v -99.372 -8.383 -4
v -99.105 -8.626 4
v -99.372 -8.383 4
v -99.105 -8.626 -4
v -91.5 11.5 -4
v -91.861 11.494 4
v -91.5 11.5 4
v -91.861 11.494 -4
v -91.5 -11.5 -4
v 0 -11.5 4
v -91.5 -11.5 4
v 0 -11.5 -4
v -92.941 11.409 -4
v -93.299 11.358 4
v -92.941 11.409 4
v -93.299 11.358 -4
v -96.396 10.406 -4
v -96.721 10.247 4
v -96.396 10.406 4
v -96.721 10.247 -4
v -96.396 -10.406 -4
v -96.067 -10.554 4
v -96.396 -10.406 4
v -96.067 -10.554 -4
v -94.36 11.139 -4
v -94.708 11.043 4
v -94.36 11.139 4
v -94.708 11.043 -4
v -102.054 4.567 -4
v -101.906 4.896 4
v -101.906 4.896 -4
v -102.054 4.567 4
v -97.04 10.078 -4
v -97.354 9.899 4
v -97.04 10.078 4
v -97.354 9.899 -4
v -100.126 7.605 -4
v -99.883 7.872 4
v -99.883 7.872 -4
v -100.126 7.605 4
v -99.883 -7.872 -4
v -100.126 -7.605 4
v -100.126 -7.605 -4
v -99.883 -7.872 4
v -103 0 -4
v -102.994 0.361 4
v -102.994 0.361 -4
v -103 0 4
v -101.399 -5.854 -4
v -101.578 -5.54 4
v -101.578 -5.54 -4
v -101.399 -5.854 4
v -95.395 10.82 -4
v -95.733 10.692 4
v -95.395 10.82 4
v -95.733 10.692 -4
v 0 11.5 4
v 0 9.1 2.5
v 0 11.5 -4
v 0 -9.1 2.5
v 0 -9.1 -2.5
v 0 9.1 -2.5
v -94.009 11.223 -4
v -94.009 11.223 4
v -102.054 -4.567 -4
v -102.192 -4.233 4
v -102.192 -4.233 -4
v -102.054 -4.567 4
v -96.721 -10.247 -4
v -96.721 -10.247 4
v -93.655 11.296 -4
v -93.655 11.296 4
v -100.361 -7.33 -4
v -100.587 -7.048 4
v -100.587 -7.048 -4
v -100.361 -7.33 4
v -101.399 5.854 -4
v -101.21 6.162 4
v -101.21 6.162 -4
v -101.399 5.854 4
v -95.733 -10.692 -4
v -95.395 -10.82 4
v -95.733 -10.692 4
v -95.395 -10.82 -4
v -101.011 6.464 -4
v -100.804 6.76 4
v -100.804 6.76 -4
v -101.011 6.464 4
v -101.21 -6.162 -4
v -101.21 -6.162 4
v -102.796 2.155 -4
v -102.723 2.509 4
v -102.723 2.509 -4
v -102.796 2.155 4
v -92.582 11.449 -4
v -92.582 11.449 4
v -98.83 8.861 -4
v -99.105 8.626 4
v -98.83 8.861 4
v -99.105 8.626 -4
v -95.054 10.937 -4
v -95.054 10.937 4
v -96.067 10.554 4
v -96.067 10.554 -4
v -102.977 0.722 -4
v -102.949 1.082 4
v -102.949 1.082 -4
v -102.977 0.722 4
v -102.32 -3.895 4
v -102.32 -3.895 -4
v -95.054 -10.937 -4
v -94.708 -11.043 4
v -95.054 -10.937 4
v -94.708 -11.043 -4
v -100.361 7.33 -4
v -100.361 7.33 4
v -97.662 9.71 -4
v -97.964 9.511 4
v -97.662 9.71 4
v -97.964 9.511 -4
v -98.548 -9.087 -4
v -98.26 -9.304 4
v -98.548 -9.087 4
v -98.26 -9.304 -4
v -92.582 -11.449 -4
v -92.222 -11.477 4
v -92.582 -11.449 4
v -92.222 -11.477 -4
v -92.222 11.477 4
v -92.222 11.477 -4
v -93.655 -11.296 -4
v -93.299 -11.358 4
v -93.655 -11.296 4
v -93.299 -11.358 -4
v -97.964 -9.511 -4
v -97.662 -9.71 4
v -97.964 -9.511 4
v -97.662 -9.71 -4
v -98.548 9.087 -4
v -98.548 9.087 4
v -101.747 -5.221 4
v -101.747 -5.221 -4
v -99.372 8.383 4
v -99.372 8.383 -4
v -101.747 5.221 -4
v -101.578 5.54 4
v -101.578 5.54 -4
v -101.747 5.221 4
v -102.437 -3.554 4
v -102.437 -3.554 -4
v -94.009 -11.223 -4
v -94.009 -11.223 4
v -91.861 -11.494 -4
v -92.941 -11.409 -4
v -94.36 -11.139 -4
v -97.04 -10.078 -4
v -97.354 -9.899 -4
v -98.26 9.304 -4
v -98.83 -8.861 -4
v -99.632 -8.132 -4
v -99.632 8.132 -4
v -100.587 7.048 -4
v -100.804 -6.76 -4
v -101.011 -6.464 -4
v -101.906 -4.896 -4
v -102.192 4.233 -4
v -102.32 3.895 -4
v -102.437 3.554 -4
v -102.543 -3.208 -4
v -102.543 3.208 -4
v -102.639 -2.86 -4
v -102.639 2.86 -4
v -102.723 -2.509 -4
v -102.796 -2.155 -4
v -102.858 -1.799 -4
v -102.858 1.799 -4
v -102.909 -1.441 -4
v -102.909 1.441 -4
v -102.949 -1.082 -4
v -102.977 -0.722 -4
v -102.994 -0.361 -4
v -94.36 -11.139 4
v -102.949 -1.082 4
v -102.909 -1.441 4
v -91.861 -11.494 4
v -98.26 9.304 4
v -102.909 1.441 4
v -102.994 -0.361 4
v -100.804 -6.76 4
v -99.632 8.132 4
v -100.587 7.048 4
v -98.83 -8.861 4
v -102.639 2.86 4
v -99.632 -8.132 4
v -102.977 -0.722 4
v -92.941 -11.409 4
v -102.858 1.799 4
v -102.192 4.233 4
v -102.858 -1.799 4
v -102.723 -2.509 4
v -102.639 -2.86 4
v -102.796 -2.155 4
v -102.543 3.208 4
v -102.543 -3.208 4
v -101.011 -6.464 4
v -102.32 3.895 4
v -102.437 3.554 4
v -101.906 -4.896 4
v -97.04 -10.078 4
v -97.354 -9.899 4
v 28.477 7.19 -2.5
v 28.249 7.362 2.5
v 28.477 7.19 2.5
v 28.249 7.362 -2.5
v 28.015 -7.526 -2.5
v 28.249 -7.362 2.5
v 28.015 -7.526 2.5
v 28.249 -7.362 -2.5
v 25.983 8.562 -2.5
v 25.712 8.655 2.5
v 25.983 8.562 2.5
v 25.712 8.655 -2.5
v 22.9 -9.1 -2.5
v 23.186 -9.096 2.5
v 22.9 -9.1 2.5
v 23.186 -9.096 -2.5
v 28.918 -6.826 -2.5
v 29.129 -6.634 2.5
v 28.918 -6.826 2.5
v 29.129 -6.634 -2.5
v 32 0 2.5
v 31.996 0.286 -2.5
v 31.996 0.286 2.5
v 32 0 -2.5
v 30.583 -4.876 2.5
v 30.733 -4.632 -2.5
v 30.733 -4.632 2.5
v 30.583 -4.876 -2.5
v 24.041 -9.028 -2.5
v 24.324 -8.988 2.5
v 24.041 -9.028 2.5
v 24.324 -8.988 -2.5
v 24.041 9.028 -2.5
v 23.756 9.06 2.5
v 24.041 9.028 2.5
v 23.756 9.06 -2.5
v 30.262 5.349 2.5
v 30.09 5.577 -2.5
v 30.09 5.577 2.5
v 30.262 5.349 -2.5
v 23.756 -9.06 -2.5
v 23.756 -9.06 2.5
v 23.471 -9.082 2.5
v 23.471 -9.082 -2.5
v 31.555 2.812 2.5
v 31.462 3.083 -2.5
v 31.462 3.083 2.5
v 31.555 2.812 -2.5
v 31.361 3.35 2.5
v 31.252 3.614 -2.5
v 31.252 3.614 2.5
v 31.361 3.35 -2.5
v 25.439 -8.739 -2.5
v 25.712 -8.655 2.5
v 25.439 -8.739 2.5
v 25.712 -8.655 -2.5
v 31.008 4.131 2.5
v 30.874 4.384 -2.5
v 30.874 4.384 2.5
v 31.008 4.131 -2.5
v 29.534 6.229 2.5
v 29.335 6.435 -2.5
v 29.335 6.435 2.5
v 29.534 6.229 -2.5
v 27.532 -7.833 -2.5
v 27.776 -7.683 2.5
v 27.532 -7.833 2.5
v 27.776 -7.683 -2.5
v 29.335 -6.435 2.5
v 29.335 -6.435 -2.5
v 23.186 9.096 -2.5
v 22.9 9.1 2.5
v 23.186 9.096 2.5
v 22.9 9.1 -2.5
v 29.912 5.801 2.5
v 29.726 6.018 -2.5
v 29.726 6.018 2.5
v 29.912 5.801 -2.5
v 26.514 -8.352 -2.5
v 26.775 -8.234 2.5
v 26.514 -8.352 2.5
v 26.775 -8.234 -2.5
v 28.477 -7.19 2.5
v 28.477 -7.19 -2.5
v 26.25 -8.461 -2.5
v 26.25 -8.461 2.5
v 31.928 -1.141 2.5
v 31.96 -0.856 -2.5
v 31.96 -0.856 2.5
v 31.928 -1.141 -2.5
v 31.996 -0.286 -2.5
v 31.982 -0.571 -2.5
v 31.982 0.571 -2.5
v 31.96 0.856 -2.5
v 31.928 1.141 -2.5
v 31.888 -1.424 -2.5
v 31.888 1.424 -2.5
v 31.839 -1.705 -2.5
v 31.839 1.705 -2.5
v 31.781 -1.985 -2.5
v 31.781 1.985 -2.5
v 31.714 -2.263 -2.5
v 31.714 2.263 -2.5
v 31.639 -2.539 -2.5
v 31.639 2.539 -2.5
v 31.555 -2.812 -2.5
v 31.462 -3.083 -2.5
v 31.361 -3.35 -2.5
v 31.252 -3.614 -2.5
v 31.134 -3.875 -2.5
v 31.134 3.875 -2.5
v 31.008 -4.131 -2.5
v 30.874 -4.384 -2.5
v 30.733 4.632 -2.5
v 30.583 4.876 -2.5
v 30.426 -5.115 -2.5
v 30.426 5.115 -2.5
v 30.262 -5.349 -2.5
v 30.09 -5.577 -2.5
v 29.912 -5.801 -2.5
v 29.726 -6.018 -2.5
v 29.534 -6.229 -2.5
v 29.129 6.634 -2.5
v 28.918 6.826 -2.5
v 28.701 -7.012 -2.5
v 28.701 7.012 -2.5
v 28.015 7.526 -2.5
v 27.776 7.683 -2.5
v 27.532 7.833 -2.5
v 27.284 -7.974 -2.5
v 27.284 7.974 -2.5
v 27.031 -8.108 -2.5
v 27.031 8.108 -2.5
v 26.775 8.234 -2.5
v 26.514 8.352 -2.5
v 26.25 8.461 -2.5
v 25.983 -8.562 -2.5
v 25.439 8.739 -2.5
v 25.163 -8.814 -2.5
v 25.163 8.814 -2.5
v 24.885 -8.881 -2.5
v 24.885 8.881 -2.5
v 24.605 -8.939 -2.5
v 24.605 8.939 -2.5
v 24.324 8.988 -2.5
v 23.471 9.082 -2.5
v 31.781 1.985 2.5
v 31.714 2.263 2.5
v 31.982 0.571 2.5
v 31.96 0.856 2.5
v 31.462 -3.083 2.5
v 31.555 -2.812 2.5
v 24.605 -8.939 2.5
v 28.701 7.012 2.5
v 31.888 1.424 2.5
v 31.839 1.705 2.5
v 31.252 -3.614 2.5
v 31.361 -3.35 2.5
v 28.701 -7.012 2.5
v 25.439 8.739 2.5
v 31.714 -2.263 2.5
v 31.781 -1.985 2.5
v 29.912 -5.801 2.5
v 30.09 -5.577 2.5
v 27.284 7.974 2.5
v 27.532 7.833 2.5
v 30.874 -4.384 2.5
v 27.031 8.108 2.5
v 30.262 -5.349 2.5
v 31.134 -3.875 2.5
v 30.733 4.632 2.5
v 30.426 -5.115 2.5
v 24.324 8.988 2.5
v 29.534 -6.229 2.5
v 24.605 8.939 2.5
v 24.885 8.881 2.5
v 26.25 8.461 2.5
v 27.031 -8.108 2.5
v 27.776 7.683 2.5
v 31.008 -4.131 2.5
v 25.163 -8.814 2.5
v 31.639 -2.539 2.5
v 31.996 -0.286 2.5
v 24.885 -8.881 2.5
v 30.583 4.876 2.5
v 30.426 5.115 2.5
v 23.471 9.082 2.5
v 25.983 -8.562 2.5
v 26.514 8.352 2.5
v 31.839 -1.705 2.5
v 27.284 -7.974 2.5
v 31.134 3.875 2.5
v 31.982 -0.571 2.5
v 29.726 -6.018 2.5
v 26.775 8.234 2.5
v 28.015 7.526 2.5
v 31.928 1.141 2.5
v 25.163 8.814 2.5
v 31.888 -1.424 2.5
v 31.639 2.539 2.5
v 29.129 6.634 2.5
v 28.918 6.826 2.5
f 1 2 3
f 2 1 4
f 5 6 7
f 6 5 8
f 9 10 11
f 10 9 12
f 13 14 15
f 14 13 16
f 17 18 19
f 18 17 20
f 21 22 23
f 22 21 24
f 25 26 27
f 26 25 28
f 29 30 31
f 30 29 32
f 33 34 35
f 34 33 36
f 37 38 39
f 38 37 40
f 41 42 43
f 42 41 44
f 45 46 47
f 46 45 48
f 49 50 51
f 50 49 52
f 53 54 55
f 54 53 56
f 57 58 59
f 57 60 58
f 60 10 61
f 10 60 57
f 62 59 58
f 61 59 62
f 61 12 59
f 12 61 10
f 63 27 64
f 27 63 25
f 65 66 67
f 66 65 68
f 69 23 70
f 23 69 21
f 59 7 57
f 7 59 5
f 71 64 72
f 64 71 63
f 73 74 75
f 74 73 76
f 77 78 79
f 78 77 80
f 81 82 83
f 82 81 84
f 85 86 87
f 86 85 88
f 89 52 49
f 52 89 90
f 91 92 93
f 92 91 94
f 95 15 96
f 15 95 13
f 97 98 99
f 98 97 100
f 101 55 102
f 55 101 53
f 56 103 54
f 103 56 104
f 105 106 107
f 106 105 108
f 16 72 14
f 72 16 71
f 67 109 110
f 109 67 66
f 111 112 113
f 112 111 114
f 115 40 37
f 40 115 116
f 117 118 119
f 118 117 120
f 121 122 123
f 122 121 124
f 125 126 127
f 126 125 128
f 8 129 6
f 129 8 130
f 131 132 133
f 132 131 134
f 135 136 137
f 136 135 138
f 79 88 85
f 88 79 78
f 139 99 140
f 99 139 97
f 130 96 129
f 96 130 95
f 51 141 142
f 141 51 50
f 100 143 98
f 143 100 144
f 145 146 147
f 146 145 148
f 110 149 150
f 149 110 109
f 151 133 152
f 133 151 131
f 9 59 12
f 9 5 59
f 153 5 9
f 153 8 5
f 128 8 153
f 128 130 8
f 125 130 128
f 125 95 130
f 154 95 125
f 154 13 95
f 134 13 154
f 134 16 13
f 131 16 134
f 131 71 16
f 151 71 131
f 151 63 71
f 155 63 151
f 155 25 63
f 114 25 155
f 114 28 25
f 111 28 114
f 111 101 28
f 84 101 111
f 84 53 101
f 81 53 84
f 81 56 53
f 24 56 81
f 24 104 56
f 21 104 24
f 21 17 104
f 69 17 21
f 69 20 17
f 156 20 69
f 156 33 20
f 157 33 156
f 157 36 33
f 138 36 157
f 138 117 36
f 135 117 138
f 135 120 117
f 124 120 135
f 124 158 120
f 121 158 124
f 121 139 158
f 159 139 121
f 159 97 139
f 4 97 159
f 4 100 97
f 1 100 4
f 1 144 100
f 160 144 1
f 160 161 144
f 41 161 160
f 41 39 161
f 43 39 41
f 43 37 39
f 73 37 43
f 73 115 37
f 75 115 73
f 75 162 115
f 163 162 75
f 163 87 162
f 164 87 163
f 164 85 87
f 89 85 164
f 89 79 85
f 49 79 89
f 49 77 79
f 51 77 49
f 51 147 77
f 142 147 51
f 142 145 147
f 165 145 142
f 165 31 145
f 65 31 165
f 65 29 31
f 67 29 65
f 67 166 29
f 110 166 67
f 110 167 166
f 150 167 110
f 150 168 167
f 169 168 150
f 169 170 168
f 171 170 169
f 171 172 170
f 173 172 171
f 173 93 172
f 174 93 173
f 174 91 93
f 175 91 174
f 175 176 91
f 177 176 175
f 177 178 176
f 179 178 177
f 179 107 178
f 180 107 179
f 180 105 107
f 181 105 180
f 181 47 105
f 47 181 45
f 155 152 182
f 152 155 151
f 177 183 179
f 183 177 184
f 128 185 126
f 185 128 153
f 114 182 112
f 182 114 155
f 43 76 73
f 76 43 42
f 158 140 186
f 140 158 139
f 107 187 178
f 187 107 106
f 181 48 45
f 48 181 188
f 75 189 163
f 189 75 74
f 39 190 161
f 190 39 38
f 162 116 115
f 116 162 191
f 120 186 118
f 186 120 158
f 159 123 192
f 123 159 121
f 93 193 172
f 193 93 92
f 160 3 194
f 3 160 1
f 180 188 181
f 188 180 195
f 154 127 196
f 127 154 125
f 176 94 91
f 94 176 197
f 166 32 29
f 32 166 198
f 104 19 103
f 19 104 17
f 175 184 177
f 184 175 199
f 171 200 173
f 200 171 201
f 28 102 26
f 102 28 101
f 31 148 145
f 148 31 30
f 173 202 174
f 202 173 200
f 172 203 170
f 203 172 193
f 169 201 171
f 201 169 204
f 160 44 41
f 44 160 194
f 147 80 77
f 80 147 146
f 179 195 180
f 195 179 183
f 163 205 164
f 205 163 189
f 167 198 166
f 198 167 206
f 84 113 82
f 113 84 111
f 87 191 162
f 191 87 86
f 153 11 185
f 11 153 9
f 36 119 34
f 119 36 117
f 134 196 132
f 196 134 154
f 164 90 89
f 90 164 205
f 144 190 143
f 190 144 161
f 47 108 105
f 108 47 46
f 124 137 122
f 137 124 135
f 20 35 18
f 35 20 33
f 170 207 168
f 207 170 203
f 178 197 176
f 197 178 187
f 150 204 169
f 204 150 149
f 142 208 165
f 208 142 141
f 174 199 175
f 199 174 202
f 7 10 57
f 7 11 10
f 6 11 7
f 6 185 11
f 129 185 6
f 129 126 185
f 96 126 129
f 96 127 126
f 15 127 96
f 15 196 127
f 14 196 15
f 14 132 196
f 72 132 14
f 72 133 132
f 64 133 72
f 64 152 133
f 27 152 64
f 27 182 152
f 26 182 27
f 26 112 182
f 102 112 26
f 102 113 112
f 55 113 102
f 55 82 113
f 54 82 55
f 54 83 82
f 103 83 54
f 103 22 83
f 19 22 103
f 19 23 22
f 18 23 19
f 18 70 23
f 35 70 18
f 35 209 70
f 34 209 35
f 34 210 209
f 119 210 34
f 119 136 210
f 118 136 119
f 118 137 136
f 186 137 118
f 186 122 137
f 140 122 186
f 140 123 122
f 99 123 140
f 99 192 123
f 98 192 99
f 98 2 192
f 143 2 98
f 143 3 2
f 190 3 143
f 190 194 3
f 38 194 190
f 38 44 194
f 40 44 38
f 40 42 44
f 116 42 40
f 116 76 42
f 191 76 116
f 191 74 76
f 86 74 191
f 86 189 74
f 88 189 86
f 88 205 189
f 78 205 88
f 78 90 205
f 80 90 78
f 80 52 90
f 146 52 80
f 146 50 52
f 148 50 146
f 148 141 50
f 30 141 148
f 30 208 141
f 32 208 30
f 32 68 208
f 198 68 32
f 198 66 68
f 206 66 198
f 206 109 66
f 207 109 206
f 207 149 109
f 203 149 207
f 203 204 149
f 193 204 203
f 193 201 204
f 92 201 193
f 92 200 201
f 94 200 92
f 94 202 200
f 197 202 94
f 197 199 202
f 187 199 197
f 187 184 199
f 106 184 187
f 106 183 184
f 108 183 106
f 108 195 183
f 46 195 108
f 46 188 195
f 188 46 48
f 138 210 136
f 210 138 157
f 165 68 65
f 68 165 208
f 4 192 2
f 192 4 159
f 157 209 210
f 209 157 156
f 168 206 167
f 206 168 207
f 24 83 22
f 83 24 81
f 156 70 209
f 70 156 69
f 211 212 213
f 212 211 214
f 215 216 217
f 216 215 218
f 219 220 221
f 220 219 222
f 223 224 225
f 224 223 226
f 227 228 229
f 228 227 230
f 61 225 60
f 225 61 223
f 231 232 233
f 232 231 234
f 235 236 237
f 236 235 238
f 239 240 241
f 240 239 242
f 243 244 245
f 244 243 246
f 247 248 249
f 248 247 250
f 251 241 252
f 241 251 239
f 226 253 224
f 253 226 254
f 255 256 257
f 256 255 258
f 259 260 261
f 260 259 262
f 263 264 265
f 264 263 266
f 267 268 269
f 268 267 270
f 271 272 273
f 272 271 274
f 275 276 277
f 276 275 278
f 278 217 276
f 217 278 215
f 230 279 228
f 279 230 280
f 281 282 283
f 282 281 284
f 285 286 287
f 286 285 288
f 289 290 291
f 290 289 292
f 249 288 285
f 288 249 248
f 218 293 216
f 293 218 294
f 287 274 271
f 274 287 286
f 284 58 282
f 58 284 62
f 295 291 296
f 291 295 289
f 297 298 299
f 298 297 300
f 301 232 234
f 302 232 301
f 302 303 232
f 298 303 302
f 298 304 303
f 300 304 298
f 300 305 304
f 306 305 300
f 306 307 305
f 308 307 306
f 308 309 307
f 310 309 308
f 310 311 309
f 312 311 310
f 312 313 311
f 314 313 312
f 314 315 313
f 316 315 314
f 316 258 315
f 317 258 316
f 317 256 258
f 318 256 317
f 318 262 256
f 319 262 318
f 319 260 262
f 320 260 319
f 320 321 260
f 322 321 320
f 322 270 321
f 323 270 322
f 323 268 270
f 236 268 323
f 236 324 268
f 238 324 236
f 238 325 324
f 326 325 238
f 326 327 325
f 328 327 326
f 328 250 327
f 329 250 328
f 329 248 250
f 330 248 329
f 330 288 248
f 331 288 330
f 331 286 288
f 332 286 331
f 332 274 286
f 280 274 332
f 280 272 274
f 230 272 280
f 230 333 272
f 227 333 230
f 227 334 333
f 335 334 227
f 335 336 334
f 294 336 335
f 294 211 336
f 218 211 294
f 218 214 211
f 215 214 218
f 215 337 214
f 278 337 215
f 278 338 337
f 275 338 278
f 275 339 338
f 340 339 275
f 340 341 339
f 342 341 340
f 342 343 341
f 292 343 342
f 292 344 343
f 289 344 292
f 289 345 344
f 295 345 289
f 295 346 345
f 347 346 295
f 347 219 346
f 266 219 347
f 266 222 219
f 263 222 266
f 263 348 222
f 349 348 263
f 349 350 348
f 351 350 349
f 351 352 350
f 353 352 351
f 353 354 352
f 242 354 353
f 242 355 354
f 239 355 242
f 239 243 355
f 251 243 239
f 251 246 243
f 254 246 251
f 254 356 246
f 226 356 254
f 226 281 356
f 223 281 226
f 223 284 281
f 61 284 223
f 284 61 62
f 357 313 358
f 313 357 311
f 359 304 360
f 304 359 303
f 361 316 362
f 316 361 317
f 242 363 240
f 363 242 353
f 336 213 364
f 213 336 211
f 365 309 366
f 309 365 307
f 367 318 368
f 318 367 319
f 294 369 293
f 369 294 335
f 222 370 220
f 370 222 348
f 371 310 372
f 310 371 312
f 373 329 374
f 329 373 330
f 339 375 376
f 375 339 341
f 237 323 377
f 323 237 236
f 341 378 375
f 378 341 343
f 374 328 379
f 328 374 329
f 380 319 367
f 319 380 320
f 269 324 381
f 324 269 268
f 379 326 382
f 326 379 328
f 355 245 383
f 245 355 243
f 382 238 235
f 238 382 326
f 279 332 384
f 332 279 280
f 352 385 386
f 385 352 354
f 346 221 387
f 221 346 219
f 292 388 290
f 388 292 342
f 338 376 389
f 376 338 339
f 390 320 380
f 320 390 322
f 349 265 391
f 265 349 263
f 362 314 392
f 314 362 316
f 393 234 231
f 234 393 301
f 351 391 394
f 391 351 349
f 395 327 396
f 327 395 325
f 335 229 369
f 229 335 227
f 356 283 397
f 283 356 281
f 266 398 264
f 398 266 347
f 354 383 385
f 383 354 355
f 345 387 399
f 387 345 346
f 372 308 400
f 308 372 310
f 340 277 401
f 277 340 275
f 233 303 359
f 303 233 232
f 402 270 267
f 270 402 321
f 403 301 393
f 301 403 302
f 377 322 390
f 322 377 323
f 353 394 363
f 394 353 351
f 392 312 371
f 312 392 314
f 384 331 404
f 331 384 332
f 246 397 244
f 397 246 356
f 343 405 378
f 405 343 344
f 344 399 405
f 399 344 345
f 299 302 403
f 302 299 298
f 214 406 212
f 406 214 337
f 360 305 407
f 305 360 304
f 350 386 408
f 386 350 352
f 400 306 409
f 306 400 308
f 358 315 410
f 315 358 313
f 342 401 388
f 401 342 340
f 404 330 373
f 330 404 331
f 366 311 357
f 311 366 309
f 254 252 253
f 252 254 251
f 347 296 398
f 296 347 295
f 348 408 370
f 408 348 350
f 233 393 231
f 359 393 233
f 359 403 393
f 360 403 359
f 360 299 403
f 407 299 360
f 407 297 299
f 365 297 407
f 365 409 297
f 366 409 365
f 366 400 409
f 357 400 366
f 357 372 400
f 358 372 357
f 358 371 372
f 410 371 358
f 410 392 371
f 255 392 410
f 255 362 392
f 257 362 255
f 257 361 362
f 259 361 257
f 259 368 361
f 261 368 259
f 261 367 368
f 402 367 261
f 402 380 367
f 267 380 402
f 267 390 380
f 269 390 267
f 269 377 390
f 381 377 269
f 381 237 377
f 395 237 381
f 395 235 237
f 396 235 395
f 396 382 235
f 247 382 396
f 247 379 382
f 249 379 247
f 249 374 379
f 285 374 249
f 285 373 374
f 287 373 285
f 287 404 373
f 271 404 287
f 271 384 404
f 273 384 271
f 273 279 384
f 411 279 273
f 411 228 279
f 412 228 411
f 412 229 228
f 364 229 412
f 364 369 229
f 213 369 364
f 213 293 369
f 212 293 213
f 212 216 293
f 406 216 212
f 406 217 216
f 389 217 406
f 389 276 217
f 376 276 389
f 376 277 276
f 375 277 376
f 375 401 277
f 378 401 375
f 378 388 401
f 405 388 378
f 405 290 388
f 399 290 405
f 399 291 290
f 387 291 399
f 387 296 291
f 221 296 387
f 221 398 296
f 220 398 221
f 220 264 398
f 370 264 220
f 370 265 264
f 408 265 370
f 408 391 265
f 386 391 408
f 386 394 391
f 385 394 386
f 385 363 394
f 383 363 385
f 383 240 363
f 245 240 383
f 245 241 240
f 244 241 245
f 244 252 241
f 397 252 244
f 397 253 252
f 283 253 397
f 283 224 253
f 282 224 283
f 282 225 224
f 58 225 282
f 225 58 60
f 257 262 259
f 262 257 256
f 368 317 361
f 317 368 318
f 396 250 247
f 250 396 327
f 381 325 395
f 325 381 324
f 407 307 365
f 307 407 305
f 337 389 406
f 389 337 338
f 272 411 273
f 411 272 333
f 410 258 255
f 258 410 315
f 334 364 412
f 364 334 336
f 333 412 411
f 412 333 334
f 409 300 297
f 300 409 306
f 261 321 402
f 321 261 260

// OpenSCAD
GRIP_LENGTH = 80;
GRIP_WIDTH = 23;
GRIP_THICKNESS = 8;

INSERT_WIDTH = 18.2;
INSERT_THICKNESS = 5;
INSERT_LENGTH = 32;

$fn = 200;

union() {
    hull() {
        translate([-GRIP_LENGTH-GRIP_WIDTH/2, 0, -GRIP_THICKNESS/2])
        cylinder(d = GRIP_WIDTH, h = GRIP_THICKNESS);

        translate([-GRIP_WIDTH, -GRIP_WIDTH/2, -GRIP_THICKNESS/2])
        cube(size = [GRIP_WIDTH, GRIP_WIDTH, GRIP_THICKNESS]);   
    }
    hull() {
        translate([INSERT_LENGTH-INSERT_WIDTH/2, 0, -INSERT_THICKNESS/2])
        cylinder(d = INSERT_WIDTH, h = INSERT_THICKNESS);

        translate([-INSERT_WIDTH/2, -INSERT_WIDTH/2, -INSERT_THICKNESS/2])
        cube(size = [INSERT_WIDTH, INSERT_WIDTH, INSERT_THICKNESS]);   
    }
}
